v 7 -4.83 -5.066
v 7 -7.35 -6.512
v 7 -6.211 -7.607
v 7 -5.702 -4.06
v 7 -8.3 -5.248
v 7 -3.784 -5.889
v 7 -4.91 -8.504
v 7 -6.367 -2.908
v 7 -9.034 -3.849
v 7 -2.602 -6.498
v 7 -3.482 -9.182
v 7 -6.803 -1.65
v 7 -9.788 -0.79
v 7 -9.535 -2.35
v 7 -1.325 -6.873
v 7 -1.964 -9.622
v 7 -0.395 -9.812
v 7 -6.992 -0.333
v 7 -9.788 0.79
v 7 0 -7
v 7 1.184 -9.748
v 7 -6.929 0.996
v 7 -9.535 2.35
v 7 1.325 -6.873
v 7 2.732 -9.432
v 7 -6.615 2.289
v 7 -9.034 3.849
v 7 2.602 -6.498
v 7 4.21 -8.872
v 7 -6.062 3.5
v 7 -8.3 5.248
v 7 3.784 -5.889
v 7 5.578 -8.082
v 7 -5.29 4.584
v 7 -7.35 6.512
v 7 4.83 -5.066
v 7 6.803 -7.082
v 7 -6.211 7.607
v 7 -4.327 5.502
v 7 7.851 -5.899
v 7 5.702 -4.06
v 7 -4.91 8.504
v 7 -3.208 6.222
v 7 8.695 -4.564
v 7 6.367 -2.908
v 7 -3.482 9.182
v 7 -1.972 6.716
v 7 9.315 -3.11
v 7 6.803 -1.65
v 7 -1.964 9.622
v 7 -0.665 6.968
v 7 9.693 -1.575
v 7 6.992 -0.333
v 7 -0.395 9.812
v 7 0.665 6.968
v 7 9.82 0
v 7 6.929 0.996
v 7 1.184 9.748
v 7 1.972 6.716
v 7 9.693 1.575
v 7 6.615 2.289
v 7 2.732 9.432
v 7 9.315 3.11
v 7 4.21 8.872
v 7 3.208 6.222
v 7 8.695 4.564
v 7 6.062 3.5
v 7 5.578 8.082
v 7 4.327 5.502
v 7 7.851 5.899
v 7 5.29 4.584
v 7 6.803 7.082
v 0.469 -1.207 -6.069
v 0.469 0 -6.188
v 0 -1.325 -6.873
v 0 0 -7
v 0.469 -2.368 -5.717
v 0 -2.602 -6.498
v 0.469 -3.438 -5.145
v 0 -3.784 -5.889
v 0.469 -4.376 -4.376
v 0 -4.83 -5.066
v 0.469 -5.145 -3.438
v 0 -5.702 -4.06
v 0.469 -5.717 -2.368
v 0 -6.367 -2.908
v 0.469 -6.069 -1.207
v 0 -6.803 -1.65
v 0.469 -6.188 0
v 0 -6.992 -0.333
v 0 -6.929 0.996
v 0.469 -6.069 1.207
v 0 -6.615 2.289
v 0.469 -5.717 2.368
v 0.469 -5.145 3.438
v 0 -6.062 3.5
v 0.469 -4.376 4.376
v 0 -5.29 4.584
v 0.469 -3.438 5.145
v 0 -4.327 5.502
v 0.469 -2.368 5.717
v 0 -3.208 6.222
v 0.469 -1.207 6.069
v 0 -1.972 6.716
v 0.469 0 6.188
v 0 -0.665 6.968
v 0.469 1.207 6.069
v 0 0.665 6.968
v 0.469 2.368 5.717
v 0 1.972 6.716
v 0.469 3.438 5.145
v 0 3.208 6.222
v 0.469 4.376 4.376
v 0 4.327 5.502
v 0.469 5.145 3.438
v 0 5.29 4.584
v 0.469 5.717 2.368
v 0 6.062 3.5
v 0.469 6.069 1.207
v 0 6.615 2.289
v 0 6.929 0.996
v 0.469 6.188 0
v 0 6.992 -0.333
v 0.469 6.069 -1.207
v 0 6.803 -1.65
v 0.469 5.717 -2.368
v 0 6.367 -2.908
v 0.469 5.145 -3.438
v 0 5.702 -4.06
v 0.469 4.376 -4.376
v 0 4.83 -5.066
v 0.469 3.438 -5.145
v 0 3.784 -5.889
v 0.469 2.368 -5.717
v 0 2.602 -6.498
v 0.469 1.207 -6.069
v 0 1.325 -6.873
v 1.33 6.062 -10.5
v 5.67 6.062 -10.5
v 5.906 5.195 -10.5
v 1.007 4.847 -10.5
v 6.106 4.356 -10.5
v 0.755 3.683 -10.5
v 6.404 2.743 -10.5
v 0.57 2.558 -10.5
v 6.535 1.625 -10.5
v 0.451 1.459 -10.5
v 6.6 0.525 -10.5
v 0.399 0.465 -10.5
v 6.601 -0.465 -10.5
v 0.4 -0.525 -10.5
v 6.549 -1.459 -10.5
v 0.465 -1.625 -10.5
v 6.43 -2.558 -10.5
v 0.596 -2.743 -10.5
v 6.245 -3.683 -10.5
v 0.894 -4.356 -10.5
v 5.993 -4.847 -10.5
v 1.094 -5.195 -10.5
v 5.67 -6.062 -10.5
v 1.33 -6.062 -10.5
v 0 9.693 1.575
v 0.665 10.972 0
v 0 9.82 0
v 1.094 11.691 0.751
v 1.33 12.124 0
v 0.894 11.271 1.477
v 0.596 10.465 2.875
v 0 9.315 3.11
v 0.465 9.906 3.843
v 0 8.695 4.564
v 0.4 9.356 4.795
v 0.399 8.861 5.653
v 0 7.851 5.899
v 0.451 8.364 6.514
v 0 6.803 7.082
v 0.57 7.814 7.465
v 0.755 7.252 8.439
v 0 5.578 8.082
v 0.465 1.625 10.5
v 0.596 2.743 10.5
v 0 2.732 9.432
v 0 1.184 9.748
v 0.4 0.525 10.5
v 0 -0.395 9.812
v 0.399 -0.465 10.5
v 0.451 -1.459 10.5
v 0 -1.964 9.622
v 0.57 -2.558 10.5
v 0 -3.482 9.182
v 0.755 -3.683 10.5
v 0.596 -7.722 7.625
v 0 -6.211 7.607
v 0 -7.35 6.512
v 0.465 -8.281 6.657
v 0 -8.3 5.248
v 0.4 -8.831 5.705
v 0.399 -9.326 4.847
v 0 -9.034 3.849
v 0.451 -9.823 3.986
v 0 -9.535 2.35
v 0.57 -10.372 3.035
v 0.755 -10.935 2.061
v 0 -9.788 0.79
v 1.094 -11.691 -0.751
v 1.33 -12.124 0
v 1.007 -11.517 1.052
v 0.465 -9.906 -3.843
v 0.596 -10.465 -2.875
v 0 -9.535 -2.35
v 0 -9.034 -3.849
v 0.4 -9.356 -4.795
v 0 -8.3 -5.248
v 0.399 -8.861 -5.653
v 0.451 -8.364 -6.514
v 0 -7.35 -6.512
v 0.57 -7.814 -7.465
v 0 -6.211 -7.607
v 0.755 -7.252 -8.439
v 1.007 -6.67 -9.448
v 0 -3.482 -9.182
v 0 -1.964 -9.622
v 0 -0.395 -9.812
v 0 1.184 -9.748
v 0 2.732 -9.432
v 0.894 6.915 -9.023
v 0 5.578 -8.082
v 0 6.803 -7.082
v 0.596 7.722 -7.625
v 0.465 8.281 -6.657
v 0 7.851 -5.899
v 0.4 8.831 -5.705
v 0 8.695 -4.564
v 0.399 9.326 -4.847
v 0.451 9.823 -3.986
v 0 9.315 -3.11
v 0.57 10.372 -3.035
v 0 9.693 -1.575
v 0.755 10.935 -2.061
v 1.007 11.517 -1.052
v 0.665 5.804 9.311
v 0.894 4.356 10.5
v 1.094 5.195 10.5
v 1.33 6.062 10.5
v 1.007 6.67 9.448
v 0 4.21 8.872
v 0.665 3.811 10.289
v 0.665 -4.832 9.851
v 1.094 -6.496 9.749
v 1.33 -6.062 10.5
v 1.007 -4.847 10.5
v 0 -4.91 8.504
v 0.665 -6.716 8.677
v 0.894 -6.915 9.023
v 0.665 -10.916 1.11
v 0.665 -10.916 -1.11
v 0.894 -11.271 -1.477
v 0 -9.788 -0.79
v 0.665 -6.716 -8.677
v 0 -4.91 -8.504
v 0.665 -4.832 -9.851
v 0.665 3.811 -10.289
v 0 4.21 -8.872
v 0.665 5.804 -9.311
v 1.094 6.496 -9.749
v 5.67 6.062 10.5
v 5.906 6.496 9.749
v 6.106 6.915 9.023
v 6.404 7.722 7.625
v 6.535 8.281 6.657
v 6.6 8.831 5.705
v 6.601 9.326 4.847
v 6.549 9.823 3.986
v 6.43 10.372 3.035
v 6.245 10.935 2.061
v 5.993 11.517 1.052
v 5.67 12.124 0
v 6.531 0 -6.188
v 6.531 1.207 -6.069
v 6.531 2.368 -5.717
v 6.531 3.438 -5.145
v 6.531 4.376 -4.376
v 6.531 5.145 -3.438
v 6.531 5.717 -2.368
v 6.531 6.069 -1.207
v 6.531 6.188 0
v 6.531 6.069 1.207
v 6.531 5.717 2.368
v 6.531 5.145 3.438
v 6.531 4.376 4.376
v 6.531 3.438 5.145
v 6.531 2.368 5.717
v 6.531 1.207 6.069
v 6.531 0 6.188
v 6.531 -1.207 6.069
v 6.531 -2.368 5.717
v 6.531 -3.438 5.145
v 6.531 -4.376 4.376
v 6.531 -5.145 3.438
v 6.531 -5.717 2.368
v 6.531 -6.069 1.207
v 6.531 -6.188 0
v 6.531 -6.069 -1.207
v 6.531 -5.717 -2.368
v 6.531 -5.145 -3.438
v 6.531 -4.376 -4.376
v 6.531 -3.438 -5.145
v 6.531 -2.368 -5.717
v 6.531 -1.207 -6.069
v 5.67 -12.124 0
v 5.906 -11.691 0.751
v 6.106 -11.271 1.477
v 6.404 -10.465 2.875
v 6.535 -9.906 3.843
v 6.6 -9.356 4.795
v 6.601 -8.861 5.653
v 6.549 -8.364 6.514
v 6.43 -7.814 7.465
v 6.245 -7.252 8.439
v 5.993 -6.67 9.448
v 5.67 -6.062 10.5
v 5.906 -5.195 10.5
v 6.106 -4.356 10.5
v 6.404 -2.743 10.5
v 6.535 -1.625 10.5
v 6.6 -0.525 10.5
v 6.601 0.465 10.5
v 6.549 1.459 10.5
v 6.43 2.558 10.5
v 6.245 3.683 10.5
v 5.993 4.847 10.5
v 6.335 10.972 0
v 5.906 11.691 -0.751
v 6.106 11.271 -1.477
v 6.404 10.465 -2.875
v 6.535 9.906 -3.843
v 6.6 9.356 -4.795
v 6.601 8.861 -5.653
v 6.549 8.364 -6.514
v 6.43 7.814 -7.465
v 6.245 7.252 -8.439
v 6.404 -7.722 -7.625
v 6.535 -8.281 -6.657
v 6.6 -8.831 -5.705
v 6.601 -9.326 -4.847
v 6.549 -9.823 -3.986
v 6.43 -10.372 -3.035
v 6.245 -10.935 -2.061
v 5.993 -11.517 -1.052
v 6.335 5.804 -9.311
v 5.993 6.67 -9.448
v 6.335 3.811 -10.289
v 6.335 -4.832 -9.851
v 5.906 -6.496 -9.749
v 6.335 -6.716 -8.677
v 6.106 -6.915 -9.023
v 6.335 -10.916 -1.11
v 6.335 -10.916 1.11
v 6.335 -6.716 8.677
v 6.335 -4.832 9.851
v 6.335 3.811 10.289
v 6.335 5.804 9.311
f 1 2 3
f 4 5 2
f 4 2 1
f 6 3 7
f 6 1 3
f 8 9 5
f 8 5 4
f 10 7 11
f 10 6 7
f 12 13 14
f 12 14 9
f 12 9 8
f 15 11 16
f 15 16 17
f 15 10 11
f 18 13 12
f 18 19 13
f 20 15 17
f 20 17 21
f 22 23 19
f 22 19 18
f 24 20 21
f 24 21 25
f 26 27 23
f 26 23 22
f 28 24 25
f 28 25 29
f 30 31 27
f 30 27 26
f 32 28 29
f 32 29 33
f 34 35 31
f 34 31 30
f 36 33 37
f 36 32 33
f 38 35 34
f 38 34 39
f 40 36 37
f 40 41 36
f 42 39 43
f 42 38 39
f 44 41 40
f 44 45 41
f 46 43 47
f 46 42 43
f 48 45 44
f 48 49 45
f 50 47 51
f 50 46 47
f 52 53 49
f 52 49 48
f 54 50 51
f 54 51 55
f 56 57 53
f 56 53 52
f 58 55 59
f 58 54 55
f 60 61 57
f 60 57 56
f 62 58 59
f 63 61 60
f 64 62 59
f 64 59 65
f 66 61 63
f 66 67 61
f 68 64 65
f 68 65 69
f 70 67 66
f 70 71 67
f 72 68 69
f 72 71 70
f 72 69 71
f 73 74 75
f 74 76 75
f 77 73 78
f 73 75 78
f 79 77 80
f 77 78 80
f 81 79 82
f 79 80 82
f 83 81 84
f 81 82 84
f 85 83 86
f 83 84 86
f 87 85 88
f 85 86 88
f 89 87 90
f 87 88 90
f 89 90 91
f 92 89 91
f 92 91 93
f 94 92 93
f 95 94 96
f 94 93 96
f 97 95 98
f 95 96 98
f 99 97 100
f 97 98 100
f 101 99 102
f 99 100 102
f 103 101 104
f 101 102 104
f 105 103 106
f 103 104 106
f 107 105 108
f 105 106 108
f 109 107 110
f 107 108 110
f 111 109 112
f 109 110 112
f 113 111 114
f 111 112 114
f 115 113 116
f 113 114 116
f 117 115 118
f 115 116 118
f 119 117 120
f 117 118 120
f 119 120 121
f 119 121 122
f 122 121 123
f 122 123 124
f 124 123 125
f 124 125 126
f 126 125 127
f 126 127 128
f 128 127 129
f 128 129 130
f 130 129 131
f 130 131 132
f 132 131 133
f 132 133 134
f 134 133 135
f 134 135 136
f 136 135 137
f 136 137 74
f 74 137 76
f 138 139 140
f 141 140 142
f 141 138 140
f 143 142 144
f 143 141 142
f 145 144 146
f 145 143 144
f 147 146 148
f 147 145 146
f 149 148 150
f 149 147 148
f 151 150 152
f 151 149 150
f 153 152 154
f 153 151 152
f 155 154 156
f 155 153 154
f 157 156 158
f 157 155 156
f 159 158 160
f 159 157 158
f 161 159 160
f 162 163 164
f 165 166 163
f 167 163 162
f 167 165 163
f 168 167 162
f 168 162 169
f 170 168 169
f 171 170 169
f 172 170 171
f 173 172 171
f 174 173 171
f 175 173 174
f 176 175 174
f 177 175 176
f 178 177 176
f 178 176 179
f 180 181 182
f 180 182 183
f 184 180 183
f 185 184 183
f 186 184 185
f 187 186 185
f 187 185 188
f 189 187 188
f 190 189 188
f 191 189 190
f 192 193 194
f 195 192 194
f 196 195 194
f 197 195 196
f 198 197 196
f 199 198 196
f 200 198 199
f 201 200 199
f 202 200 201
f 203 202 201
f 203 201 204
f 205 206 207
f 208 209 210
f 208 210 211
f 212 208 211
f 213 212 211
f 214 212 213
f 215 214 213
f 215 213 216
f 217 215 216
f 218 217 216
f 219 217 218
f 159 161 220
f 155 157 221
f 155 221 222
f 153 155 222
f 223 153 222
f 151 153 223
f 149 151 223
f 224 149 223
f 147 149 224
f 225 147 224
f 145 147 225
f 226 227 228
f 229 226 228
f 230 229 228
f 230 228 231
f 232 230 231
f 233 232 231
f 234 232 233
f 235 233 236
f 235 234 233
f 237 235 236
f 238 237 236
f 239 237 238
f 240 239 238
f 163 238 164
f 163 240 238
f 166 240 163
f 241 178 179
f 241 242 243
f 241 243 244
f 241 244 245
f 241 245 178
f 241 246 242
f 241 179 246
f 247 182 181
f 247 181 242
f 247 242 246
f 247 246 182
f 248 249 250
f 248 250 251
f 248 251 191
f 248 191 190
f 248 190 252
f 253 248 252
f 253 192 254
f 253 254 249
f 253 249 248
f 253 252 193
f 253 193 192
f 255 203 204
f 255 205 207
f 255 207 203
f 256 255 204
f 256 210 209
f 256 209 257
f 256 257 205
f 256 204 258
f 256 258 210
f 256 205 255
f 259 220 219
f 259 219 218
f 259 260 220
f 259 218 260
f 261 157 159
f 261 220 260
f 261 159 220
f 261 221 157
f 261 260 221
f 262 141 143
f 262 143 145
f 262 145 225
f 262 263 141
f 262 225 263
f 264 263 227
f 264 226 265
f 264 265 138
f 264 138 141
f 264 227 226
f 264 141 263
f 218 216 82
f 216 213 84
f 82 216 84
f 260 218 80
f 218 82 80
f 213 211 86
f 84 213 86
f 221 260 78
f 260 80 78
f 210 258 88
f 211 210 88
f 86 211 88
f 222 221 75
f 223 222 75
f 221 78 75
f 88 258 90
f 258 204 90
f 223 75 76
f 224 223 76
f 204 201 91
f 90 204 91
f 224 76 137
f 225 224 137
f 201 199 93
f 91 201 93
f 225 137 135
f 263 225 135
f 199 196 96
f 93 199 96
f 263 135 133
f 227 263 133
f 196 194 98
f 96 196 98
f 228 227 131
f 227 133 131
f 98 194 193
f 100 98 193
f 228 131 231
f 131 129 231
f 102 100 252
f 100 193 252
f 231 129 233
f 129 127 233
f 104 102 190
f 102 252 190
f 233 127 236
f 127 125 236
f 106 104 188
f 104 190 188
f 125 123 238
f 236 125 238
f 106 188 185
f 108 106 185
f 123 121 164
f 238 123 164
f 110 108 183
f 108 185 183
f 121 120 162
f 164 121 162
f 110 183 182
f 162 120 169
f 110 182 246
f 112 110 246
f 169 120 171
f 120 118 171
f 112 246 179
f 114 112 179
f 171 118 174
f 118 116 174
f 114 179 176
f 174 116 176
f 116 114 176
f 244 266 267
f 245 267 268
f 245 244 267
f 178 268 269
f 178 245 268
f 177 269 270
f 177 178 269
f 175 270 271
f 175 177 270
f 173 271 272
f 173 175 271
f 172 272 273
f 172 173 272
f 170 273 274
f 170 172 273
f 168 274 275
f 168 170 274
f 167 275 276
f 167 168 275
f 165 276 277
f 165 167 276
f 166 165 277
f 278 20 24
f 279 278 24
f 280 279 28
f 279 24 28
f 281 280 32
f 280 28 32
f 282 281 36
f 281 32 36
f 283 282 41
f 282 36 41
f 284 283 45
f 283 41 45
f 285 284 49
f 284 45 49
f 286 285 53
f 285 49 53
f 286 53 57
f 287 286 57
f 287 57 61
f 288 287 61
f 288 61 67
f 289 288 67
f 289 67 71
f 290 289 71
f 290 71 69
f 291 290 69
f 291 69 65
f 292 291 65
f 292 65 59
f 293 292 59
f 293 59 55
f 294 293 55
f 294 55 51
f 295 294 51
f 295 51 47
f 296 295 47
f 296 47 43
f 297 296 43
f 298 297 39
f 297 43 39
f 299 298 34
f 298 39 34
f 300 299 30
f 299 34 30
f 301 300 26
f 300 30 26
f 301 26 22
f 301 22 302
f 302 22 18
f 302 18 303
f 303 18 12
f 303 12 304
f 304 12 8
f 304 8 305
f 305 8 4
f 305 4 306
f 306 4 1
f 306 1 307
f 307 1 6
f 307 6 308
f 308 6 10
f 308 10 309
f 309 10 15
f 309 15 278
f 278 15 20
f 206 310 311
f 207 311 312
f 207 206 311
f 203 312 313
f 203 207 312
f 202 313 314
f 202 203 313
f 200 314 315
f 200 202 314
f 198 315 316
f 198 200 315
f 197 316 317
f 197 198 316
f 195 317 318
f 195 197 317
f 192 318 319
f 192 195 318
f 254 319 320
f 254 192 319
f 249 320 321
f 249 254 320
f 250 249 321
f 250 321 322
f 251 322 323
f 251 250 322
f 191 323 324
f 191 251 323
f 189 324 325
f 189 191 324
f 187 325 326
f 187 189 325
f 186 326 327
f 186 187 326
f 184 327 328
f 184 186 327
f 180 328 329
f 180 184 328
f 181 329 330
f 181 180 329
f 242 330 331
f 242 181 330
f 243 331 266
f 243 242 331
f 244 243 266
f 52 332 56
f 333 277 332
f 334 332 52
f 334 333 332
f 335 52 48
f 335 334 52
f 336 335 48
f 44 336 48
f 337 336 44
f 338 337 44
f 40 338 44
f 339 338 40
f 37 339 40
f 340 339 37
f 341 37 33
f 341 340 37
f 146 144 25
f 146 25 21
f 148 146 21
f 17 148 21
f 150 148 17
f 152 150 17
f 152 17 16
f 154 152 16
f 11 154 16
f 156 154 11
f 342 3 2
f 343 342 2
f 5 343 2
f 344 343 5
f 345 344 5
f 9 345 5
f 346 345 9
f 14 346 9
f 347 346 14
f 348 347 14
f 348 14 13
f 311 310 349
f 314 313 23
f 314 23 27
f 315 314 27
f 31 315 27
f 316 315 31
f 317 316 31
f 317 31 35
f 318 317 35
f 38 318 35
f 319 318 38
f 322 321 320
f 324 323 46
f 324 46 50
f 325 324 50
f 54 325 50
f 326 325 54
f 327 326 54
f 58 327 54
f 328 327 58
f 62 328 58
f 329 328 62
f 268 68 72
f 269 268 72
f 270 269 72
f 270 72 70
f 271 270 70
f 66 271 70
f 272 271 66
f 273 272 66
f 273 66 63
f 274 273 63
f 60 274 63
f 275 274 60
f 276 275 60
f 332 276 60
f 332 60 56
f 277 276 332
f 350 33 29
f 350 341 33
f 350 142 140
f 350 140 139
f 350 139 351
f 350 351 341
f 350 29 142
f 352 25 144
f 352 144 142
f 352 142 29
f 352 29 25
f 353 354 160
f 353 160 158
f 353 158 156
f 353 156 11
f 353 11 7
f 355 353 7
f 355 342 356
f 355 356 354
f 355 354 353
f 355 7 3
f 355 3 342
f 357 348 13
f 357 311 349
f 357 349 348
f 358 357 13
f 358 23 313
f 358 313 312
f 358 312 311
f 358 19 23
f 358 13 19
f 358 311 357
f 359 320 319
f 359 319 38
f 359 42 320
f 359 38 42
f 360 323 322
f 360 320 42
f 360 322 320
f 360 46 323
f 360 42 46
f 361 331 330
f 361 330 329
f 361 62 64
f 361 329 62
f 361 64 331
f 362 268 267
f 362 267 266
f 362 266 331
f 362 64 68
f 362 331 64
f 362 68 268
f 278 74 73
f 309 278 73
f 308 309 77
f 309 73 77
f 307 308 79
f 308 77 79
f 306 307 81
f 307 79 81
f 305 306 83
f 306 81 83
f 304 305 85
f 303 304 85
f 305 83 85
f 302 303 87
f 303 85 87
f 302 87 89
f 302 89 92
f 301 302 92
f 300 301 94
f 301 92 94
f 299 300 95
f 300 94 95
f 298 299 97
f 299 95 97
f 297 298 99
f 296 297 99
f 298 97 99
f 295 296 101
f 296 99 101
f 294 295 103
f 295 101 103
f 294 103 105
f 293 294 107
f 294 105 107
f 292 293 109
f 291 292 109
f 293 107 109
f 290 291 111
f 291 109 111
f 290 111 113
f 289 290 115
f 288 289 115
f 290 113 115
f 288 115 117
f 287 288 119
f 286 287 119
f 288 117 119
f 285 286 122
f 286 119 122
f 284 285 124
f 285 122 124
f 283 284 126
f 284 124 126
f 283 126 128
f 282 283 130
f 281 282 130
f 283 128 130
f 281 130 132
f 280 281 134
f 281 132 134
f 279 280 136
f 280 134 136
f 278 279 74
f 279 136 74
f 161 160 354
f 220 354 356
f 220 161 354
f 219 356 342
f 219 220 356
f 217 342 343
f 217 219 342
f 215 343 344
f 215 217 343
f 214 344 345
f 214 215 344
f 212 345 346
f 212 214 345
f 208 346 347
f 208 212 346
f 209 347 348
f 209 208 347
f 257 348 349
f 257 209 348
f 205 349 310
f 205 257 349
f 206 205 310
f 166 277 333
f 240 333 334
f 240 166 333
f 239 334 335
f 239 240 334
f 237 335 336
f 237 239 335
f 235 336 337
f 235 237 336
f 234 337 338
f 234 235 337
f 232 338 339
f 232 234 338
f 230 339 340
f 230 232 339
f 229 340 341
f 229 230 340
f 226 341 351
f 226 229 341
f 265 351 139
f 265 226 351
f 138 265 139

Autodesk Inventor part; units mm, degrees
ref_plane "YZ Plane" through (0, 0, 0) normal (1, 0, 0) x (0, 1, 0)
ref_plane "XZ Plane" through (0, 0, 0) normal (0, 1, 0) x (-1, 0, 0)
sketch "Sketch1" plane through (0, 0, 0) normal (1, 0, 0) x (0, 1, 0)
  line L0 (-12.1244, 0) -> (-6.0622, 10.5)
  line L1 (-6.0622, 10.5) -> (6.0622, 10.5)
  line L2 (6.0622, 10.5) -> (12.1244, 0)
  line L3 (12.1244, 0) -> (6.0622, -10.5)
  line L4 (6.0622, -10.5) -> (-6.0622, -10.5)
  line L5 (-6.0622, -10.5) -> (-12.1244, 0)
  point P0 (0, 0)
  point P1 (0, 0)
  dimension "d0" = 24.2487
extrude "Body" add sketch "Sketch1" along normal blind 7
sketch "Sketch2" plane through (0, 0, 0) normal (0, 0, 1) x (1, 0, 0)
  line L0 (0, 6.0622) -> (0, 12.1244) projected
  line L1 (0, 12.1244) -> (7, 12.1244) projected
  line L2 (7, 6.0622) -> (7, 12.1244) projected
  line L3 (-1.4, 0) -> (8.4, 0) projected
  line L4 (1.3304, 12.1244) -> (0, 9.82)
  line L5 (5.6696, 12.1244) -> (7, 9.82)
  dimension "d3" = 30
  dimension "d4" = 30
  dimension "d5" = 19.64
  dimension "d6" = 19.64
revolve "Chamfer1" cut sketch "Sketch2" angle 360 about axis through (-10, 0, 0) along (1, 0, 0)
sketch "Sketch3" plane through (7, 0, 0) normal (1, 0, 0) x (0, 0, -1)
  arc A0 (-0.625, -1.0825) -> (0.625, -1.0825) centre (0, 0) ccw projected
hole "Thread" at (7, 0, 0) direction (-1, 0, 0) diameter 12.376 end through all thread size "M14x1.5" class "6H" standard "ISO Metric profile"
chamfer "Chamfer2" distance 0.8119 angle 30 1 edges at (7, 0, 6.188) measured on face at (7, 8.4992, -1.032)
chamfer "Chamfer3" distance 0.8119 angle 30 1 edges at (0, 0, 6.188) measured on face at (0, 8.4992, -1.032)
ref_plane "Work Plane1" through (-26.022, 0, 0) normal (0, -0.866, -0.5) x (1, 0, 0)
equation "\"d0\" = 1.1547 * SW"
equation "\"d1\" = KOH"
equation "\"d3\" = ANG1"
equation "\"d4\" = ANG2"
equation "\"d5\" = SW0"
equation "\"d6\" = SW01"
equation "\"d8\" = -0.5 * GD1 + 0.5 * NND"
equation "\"d40\" = -0.5 * GD1 + 0.5 * NND"
equation "\"d10\" = -0.5 * GD1 + 0.5 * NND"
equation "\"d41\" = -0.5 * GD1 + 0.5 * NND"
equation "\"ANG1\" = 30deg"
equation "\"ANG2\" = 30deg"
equation "\"NND\" = 14"
equation "\"KOH\" = 7"
equation "\"SW\" = 21"
equation "\"SW0\" = 19.64"
equation "\"SW01\" = SW0"
equation "\"GUL\" = 0.541266 * PTC"
equation "\"THREADDIA\" = 14"
equation "\"TOA\" = 30deg"
equation "\"PTC\" = 1.5"
equation "\"E0\" = 23.36"
equation "\"GAL\" = 0.541266 * PTC"
equation "\"GD1\" = 12.376202"
properties part number "ISO 8675 - M14 x 1.5" material "Stainless Steel, 440C"
